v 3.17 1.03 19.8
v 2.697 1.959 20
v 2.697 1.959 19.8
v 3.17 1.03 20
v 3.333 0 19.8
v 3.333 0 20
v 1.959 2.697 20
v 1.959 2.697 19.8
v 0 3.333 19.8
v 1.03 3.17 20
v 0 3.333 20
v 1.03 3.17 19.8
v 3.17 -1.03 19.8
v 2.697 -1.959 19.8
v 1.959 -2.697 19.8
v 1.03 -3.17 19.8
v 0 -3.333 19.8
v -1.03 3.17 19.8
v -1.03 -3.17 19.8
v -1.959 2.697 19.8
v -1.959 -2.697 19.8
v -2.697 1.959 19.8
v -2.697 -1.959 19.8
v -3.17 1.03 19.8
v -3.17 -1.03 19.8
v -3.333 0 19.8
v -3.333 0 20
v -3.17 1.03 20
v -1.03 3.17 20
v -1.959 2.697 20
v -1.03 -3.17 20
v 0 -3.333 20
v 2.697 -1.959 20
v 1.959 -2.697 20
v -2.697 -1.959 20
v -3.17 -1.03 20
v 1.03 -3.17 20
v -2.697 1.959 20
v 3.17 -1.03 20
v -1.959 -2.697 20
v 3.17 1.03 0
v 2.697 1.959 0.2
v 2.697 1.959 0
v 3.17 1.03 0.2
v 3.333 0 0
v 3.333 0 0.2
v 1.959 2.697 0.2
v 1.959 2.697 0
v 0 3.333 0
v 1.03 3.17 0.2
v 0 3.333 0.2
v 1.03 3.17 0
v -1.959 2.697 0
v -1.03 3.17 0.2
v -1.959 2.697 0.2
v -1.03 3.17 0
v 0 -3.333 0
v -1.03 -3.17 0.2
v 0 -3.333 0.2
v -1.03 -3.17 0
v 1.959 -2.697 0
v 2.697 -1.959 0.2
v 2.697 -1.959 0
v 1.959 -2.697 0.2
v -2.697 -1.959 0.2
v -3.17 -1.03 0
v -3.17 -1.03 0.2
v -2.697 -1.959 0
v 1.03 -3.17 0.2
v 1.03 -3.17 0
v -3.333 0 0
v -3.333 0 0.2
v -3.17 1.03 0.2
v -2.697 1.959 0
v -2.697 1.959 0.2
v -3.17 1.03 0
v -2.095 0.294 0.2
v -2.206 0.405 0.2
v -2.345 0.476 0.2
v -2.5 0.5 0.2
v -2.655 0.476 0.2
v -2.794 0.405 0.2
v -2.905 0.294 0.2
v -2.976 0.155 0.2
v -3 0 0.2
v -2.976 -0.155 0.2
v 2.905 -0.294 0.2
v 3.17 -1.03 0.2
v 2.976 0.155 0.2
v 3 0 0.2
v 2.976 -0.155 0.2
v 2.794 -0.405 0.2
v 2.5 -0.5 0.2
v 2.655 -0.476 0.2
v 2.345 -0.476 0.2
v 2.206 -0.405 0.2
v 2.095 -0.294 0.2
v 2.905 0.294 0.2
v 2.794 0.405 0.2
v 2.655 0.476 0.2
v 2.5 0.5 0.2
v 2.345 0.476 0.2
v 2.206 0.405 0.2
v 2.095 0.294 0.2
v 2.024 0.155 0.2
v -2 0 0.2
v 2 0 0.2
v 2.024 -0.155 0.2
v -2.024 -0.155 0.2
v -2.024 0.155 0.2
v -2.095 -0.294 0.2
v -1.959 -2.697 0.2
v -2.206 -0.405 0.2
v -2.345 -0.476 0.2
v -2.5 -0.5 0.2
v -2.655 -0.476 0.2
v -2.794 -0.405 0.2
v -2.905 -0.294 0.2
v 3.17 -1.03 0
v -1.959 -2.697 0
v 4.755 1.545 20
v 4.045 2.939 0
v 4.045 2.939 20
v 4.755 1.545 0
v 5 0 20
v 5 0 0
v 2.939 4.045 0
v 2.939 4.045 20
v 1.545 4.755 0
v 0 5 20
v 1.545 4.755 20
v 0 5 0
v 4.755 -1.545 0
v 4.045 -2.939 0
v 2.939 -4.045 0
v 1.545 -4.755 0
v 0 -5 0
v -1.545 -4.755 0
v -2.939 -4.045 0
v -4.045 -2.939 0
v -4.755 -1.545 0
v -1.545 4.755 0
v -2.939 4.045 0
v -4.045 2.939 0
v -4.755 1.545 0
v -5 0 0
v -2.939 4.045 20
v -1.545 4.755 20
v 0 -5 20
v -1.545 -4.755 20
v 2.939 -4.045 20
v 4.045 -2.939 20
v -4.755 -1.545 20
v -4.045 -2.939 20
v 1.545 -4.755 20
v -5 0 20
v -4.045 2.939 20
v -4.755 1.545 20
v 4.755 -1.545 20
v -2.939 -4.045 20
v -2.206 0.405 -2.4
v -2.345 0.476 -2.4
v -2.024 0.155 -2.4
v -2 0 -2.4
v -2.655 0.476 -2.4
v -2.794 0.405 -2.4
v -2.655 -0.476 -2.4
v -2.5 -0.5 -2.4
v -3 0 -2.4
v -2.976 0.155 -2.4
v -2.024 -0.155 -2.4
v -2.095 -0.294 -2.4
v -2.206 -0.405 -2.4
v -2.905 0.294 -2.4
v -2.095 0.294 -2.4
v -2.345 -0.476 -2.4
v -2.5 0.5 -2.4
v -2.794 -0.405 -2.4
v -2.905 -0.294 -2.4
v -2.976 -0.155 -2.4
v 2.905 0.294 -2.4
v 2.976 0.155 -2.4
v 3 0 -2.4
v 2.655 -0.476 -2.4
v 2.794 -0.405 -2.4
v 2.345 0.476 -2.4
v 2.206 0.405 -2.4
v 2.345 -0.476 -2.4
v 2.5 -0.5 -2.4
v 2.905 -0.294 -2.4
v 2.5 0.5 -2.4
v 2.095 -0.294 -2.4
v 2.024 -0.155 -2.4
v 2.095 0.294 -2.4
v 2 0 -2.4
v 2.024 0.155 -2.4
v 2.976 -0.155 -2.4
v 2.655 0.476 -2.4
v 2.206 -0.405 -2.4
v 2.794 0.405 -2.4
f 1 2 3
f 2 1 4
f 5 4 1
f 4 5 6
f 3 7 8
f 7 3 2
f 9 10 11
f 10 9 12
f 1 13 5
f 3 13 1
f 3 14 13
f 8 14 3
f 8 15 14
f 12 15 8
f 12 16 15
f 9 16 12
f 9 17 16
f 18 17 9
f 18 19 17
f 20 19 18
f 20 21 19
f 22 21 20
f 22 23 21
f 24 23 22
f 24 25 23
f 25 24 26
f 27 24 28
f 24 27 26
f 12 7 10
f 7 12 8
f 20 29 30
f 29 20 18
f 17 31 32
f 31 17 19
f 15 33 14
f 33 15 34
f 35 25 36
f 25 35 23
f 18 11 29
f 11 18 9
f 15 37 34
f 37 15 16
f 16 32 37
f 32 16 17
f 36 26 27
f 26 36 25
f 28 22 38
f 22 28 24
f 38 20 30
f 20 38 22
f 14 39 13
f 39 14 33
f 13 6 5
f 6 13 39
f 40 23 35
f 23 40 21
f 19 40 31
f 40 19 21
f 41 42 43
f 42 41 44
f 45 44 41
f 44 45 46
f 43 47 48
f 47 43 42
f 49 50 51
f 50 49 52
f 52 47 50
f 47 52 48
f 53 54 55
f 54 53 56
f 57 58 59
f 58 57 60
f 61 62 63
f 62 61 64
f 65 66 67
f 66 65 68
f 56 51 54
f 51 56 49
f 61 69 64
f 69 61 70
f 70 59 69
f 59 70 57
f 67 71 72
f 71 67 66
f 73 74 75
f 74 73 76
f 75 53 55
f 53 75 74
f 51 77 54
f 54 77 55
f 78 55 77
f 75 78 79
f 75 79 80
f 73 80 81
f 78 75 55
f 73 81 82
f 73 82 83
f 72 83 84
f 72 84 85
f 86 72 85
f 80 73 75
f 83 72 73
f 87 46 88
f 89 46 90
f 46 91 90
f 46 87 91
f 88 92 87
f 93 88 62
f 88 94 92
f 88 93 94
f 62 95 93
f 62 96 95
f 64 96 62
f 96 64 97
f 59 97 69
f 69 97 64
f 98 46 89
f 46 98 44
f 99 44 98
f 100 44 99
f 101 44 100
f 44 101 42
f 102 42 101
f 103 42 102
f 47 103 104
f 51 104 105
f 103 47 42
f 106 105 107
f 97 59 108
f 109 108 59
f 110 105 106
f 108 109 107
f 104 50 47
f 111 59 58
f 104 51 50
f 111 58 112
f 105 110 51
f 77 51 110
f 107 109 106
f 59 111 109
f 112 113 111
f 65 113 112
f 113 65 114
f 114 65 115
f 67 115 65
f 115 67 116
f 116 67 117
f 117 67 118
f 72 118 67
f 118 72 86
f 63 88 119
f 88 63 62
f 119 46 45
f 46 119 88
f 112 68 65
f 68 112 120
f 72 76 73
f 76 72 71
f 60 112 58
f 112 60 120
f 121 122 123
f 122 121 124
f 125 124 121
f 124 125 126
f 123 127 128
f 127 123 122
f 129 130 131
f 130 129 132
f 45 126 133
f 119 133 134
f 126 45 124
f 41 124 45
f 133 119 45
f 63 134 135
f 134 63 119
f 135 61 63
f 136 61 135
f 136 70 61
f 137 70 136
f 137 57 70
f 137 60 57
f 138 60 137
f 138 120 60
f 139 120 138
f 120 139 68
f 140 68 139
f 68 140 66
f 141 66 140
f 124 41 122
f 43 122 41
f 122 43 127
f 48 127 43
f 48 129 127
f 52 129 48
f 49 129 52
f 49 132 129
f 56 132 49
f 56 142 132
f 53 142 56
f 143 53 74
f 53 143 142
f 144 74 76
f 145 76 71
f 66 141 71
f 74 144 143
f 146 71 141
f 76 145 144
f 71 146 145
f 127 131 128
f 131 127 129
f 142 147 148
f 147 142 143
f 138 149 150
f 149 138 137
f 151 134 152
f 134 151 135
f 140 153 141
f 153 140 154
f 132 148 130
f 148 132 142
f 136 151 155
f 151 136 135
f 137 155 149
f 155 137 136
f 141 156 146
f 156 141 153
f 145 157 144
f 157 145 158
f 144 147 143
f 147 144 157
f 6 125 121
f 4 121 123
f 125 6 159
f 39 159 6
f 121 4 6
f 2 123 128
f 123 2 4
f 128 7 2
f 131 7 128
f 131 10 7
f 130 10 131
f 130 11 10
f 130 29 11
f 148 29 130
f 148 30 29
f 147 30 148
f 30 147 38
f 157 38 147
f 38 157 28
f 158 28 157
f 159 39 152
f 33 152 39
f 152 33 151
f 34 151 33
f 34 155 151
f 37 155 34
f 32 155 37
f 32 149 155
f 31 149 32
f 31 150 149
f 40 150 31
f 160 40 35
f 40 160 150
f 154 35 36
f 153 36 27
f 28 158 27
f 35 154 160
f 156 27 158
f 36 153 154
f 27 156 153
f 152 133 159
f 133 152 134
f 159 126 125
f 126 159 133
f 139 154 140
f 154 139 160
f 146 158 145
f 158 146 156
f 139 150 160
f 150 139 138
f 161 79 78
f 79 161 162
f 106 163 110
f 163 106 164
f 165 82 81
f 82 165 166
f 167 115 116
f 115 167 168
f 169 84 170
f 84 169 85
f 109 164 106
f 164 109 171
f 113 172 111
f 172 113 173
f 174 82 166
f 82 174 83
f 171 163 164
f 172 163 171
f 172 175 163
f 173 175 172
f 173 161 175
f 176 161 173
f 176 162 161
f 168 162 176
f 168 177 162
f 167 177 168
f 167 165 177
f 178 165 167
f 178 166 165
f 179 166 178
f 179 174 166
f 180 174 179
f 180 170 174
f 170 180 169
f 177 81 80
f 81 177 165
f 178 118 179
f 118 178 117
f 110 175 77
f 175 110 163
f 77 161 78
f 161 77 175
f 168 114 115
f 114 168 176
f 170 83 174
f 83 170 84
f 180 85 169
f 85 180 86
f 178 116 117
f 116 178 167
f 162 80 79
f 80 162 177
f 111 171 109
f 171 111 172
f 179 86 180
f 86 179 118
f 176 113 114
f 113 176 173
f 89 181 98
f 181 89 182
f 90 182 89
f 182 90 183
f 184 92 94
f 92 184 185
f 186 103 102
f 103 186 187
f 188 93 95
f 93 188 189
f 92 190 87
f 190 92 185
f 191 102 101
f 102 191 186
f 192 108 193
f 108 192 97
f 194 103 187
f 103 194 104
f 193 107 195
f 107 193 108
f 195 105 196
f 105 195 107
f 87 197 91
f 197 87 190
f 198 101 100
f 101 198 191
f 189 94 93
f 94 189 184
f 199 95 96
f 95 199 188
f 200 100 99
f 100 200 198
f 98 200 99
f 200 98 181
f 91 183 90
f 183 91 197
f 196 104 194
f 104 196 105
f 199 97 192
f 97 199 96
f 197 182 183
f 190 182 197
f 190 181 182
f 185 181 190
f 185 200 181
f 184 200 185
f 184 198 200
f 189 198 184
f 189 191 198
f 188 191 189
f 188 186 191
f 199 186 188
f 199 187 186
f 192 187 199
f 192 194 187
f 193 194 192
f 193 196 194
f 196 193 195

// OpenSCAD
$fn=20;

th = 0.2;
case_D = 10.0;
case_H = 20;
pin_D = 1;
pin_L = 2.6;
pin_distance = 5.0;

module case(_D, _H)
{
    difference()
    {
        cylinder(h = _H, r = _D/2);
        union()
        {
            translate([0,0,_H-th])
            cylinder(h = th*2, r = _D/3);
            translate([0,0,-th])
            cylinder(h = th*2, r = _D/3);
        }
    }
}

module pin(_D, _H)
{
    translate([0,0,-_H+th])
    cylinder(h = _H, r = _D/2);
}

union()
{
    case(case_D,case_H);
    translate([-pin_distance/2,0,0])
    pin(pin_D,pin_L);
    translate([+pin_distance/2,0,0])
    pin(pin_D,pin_L);
}
